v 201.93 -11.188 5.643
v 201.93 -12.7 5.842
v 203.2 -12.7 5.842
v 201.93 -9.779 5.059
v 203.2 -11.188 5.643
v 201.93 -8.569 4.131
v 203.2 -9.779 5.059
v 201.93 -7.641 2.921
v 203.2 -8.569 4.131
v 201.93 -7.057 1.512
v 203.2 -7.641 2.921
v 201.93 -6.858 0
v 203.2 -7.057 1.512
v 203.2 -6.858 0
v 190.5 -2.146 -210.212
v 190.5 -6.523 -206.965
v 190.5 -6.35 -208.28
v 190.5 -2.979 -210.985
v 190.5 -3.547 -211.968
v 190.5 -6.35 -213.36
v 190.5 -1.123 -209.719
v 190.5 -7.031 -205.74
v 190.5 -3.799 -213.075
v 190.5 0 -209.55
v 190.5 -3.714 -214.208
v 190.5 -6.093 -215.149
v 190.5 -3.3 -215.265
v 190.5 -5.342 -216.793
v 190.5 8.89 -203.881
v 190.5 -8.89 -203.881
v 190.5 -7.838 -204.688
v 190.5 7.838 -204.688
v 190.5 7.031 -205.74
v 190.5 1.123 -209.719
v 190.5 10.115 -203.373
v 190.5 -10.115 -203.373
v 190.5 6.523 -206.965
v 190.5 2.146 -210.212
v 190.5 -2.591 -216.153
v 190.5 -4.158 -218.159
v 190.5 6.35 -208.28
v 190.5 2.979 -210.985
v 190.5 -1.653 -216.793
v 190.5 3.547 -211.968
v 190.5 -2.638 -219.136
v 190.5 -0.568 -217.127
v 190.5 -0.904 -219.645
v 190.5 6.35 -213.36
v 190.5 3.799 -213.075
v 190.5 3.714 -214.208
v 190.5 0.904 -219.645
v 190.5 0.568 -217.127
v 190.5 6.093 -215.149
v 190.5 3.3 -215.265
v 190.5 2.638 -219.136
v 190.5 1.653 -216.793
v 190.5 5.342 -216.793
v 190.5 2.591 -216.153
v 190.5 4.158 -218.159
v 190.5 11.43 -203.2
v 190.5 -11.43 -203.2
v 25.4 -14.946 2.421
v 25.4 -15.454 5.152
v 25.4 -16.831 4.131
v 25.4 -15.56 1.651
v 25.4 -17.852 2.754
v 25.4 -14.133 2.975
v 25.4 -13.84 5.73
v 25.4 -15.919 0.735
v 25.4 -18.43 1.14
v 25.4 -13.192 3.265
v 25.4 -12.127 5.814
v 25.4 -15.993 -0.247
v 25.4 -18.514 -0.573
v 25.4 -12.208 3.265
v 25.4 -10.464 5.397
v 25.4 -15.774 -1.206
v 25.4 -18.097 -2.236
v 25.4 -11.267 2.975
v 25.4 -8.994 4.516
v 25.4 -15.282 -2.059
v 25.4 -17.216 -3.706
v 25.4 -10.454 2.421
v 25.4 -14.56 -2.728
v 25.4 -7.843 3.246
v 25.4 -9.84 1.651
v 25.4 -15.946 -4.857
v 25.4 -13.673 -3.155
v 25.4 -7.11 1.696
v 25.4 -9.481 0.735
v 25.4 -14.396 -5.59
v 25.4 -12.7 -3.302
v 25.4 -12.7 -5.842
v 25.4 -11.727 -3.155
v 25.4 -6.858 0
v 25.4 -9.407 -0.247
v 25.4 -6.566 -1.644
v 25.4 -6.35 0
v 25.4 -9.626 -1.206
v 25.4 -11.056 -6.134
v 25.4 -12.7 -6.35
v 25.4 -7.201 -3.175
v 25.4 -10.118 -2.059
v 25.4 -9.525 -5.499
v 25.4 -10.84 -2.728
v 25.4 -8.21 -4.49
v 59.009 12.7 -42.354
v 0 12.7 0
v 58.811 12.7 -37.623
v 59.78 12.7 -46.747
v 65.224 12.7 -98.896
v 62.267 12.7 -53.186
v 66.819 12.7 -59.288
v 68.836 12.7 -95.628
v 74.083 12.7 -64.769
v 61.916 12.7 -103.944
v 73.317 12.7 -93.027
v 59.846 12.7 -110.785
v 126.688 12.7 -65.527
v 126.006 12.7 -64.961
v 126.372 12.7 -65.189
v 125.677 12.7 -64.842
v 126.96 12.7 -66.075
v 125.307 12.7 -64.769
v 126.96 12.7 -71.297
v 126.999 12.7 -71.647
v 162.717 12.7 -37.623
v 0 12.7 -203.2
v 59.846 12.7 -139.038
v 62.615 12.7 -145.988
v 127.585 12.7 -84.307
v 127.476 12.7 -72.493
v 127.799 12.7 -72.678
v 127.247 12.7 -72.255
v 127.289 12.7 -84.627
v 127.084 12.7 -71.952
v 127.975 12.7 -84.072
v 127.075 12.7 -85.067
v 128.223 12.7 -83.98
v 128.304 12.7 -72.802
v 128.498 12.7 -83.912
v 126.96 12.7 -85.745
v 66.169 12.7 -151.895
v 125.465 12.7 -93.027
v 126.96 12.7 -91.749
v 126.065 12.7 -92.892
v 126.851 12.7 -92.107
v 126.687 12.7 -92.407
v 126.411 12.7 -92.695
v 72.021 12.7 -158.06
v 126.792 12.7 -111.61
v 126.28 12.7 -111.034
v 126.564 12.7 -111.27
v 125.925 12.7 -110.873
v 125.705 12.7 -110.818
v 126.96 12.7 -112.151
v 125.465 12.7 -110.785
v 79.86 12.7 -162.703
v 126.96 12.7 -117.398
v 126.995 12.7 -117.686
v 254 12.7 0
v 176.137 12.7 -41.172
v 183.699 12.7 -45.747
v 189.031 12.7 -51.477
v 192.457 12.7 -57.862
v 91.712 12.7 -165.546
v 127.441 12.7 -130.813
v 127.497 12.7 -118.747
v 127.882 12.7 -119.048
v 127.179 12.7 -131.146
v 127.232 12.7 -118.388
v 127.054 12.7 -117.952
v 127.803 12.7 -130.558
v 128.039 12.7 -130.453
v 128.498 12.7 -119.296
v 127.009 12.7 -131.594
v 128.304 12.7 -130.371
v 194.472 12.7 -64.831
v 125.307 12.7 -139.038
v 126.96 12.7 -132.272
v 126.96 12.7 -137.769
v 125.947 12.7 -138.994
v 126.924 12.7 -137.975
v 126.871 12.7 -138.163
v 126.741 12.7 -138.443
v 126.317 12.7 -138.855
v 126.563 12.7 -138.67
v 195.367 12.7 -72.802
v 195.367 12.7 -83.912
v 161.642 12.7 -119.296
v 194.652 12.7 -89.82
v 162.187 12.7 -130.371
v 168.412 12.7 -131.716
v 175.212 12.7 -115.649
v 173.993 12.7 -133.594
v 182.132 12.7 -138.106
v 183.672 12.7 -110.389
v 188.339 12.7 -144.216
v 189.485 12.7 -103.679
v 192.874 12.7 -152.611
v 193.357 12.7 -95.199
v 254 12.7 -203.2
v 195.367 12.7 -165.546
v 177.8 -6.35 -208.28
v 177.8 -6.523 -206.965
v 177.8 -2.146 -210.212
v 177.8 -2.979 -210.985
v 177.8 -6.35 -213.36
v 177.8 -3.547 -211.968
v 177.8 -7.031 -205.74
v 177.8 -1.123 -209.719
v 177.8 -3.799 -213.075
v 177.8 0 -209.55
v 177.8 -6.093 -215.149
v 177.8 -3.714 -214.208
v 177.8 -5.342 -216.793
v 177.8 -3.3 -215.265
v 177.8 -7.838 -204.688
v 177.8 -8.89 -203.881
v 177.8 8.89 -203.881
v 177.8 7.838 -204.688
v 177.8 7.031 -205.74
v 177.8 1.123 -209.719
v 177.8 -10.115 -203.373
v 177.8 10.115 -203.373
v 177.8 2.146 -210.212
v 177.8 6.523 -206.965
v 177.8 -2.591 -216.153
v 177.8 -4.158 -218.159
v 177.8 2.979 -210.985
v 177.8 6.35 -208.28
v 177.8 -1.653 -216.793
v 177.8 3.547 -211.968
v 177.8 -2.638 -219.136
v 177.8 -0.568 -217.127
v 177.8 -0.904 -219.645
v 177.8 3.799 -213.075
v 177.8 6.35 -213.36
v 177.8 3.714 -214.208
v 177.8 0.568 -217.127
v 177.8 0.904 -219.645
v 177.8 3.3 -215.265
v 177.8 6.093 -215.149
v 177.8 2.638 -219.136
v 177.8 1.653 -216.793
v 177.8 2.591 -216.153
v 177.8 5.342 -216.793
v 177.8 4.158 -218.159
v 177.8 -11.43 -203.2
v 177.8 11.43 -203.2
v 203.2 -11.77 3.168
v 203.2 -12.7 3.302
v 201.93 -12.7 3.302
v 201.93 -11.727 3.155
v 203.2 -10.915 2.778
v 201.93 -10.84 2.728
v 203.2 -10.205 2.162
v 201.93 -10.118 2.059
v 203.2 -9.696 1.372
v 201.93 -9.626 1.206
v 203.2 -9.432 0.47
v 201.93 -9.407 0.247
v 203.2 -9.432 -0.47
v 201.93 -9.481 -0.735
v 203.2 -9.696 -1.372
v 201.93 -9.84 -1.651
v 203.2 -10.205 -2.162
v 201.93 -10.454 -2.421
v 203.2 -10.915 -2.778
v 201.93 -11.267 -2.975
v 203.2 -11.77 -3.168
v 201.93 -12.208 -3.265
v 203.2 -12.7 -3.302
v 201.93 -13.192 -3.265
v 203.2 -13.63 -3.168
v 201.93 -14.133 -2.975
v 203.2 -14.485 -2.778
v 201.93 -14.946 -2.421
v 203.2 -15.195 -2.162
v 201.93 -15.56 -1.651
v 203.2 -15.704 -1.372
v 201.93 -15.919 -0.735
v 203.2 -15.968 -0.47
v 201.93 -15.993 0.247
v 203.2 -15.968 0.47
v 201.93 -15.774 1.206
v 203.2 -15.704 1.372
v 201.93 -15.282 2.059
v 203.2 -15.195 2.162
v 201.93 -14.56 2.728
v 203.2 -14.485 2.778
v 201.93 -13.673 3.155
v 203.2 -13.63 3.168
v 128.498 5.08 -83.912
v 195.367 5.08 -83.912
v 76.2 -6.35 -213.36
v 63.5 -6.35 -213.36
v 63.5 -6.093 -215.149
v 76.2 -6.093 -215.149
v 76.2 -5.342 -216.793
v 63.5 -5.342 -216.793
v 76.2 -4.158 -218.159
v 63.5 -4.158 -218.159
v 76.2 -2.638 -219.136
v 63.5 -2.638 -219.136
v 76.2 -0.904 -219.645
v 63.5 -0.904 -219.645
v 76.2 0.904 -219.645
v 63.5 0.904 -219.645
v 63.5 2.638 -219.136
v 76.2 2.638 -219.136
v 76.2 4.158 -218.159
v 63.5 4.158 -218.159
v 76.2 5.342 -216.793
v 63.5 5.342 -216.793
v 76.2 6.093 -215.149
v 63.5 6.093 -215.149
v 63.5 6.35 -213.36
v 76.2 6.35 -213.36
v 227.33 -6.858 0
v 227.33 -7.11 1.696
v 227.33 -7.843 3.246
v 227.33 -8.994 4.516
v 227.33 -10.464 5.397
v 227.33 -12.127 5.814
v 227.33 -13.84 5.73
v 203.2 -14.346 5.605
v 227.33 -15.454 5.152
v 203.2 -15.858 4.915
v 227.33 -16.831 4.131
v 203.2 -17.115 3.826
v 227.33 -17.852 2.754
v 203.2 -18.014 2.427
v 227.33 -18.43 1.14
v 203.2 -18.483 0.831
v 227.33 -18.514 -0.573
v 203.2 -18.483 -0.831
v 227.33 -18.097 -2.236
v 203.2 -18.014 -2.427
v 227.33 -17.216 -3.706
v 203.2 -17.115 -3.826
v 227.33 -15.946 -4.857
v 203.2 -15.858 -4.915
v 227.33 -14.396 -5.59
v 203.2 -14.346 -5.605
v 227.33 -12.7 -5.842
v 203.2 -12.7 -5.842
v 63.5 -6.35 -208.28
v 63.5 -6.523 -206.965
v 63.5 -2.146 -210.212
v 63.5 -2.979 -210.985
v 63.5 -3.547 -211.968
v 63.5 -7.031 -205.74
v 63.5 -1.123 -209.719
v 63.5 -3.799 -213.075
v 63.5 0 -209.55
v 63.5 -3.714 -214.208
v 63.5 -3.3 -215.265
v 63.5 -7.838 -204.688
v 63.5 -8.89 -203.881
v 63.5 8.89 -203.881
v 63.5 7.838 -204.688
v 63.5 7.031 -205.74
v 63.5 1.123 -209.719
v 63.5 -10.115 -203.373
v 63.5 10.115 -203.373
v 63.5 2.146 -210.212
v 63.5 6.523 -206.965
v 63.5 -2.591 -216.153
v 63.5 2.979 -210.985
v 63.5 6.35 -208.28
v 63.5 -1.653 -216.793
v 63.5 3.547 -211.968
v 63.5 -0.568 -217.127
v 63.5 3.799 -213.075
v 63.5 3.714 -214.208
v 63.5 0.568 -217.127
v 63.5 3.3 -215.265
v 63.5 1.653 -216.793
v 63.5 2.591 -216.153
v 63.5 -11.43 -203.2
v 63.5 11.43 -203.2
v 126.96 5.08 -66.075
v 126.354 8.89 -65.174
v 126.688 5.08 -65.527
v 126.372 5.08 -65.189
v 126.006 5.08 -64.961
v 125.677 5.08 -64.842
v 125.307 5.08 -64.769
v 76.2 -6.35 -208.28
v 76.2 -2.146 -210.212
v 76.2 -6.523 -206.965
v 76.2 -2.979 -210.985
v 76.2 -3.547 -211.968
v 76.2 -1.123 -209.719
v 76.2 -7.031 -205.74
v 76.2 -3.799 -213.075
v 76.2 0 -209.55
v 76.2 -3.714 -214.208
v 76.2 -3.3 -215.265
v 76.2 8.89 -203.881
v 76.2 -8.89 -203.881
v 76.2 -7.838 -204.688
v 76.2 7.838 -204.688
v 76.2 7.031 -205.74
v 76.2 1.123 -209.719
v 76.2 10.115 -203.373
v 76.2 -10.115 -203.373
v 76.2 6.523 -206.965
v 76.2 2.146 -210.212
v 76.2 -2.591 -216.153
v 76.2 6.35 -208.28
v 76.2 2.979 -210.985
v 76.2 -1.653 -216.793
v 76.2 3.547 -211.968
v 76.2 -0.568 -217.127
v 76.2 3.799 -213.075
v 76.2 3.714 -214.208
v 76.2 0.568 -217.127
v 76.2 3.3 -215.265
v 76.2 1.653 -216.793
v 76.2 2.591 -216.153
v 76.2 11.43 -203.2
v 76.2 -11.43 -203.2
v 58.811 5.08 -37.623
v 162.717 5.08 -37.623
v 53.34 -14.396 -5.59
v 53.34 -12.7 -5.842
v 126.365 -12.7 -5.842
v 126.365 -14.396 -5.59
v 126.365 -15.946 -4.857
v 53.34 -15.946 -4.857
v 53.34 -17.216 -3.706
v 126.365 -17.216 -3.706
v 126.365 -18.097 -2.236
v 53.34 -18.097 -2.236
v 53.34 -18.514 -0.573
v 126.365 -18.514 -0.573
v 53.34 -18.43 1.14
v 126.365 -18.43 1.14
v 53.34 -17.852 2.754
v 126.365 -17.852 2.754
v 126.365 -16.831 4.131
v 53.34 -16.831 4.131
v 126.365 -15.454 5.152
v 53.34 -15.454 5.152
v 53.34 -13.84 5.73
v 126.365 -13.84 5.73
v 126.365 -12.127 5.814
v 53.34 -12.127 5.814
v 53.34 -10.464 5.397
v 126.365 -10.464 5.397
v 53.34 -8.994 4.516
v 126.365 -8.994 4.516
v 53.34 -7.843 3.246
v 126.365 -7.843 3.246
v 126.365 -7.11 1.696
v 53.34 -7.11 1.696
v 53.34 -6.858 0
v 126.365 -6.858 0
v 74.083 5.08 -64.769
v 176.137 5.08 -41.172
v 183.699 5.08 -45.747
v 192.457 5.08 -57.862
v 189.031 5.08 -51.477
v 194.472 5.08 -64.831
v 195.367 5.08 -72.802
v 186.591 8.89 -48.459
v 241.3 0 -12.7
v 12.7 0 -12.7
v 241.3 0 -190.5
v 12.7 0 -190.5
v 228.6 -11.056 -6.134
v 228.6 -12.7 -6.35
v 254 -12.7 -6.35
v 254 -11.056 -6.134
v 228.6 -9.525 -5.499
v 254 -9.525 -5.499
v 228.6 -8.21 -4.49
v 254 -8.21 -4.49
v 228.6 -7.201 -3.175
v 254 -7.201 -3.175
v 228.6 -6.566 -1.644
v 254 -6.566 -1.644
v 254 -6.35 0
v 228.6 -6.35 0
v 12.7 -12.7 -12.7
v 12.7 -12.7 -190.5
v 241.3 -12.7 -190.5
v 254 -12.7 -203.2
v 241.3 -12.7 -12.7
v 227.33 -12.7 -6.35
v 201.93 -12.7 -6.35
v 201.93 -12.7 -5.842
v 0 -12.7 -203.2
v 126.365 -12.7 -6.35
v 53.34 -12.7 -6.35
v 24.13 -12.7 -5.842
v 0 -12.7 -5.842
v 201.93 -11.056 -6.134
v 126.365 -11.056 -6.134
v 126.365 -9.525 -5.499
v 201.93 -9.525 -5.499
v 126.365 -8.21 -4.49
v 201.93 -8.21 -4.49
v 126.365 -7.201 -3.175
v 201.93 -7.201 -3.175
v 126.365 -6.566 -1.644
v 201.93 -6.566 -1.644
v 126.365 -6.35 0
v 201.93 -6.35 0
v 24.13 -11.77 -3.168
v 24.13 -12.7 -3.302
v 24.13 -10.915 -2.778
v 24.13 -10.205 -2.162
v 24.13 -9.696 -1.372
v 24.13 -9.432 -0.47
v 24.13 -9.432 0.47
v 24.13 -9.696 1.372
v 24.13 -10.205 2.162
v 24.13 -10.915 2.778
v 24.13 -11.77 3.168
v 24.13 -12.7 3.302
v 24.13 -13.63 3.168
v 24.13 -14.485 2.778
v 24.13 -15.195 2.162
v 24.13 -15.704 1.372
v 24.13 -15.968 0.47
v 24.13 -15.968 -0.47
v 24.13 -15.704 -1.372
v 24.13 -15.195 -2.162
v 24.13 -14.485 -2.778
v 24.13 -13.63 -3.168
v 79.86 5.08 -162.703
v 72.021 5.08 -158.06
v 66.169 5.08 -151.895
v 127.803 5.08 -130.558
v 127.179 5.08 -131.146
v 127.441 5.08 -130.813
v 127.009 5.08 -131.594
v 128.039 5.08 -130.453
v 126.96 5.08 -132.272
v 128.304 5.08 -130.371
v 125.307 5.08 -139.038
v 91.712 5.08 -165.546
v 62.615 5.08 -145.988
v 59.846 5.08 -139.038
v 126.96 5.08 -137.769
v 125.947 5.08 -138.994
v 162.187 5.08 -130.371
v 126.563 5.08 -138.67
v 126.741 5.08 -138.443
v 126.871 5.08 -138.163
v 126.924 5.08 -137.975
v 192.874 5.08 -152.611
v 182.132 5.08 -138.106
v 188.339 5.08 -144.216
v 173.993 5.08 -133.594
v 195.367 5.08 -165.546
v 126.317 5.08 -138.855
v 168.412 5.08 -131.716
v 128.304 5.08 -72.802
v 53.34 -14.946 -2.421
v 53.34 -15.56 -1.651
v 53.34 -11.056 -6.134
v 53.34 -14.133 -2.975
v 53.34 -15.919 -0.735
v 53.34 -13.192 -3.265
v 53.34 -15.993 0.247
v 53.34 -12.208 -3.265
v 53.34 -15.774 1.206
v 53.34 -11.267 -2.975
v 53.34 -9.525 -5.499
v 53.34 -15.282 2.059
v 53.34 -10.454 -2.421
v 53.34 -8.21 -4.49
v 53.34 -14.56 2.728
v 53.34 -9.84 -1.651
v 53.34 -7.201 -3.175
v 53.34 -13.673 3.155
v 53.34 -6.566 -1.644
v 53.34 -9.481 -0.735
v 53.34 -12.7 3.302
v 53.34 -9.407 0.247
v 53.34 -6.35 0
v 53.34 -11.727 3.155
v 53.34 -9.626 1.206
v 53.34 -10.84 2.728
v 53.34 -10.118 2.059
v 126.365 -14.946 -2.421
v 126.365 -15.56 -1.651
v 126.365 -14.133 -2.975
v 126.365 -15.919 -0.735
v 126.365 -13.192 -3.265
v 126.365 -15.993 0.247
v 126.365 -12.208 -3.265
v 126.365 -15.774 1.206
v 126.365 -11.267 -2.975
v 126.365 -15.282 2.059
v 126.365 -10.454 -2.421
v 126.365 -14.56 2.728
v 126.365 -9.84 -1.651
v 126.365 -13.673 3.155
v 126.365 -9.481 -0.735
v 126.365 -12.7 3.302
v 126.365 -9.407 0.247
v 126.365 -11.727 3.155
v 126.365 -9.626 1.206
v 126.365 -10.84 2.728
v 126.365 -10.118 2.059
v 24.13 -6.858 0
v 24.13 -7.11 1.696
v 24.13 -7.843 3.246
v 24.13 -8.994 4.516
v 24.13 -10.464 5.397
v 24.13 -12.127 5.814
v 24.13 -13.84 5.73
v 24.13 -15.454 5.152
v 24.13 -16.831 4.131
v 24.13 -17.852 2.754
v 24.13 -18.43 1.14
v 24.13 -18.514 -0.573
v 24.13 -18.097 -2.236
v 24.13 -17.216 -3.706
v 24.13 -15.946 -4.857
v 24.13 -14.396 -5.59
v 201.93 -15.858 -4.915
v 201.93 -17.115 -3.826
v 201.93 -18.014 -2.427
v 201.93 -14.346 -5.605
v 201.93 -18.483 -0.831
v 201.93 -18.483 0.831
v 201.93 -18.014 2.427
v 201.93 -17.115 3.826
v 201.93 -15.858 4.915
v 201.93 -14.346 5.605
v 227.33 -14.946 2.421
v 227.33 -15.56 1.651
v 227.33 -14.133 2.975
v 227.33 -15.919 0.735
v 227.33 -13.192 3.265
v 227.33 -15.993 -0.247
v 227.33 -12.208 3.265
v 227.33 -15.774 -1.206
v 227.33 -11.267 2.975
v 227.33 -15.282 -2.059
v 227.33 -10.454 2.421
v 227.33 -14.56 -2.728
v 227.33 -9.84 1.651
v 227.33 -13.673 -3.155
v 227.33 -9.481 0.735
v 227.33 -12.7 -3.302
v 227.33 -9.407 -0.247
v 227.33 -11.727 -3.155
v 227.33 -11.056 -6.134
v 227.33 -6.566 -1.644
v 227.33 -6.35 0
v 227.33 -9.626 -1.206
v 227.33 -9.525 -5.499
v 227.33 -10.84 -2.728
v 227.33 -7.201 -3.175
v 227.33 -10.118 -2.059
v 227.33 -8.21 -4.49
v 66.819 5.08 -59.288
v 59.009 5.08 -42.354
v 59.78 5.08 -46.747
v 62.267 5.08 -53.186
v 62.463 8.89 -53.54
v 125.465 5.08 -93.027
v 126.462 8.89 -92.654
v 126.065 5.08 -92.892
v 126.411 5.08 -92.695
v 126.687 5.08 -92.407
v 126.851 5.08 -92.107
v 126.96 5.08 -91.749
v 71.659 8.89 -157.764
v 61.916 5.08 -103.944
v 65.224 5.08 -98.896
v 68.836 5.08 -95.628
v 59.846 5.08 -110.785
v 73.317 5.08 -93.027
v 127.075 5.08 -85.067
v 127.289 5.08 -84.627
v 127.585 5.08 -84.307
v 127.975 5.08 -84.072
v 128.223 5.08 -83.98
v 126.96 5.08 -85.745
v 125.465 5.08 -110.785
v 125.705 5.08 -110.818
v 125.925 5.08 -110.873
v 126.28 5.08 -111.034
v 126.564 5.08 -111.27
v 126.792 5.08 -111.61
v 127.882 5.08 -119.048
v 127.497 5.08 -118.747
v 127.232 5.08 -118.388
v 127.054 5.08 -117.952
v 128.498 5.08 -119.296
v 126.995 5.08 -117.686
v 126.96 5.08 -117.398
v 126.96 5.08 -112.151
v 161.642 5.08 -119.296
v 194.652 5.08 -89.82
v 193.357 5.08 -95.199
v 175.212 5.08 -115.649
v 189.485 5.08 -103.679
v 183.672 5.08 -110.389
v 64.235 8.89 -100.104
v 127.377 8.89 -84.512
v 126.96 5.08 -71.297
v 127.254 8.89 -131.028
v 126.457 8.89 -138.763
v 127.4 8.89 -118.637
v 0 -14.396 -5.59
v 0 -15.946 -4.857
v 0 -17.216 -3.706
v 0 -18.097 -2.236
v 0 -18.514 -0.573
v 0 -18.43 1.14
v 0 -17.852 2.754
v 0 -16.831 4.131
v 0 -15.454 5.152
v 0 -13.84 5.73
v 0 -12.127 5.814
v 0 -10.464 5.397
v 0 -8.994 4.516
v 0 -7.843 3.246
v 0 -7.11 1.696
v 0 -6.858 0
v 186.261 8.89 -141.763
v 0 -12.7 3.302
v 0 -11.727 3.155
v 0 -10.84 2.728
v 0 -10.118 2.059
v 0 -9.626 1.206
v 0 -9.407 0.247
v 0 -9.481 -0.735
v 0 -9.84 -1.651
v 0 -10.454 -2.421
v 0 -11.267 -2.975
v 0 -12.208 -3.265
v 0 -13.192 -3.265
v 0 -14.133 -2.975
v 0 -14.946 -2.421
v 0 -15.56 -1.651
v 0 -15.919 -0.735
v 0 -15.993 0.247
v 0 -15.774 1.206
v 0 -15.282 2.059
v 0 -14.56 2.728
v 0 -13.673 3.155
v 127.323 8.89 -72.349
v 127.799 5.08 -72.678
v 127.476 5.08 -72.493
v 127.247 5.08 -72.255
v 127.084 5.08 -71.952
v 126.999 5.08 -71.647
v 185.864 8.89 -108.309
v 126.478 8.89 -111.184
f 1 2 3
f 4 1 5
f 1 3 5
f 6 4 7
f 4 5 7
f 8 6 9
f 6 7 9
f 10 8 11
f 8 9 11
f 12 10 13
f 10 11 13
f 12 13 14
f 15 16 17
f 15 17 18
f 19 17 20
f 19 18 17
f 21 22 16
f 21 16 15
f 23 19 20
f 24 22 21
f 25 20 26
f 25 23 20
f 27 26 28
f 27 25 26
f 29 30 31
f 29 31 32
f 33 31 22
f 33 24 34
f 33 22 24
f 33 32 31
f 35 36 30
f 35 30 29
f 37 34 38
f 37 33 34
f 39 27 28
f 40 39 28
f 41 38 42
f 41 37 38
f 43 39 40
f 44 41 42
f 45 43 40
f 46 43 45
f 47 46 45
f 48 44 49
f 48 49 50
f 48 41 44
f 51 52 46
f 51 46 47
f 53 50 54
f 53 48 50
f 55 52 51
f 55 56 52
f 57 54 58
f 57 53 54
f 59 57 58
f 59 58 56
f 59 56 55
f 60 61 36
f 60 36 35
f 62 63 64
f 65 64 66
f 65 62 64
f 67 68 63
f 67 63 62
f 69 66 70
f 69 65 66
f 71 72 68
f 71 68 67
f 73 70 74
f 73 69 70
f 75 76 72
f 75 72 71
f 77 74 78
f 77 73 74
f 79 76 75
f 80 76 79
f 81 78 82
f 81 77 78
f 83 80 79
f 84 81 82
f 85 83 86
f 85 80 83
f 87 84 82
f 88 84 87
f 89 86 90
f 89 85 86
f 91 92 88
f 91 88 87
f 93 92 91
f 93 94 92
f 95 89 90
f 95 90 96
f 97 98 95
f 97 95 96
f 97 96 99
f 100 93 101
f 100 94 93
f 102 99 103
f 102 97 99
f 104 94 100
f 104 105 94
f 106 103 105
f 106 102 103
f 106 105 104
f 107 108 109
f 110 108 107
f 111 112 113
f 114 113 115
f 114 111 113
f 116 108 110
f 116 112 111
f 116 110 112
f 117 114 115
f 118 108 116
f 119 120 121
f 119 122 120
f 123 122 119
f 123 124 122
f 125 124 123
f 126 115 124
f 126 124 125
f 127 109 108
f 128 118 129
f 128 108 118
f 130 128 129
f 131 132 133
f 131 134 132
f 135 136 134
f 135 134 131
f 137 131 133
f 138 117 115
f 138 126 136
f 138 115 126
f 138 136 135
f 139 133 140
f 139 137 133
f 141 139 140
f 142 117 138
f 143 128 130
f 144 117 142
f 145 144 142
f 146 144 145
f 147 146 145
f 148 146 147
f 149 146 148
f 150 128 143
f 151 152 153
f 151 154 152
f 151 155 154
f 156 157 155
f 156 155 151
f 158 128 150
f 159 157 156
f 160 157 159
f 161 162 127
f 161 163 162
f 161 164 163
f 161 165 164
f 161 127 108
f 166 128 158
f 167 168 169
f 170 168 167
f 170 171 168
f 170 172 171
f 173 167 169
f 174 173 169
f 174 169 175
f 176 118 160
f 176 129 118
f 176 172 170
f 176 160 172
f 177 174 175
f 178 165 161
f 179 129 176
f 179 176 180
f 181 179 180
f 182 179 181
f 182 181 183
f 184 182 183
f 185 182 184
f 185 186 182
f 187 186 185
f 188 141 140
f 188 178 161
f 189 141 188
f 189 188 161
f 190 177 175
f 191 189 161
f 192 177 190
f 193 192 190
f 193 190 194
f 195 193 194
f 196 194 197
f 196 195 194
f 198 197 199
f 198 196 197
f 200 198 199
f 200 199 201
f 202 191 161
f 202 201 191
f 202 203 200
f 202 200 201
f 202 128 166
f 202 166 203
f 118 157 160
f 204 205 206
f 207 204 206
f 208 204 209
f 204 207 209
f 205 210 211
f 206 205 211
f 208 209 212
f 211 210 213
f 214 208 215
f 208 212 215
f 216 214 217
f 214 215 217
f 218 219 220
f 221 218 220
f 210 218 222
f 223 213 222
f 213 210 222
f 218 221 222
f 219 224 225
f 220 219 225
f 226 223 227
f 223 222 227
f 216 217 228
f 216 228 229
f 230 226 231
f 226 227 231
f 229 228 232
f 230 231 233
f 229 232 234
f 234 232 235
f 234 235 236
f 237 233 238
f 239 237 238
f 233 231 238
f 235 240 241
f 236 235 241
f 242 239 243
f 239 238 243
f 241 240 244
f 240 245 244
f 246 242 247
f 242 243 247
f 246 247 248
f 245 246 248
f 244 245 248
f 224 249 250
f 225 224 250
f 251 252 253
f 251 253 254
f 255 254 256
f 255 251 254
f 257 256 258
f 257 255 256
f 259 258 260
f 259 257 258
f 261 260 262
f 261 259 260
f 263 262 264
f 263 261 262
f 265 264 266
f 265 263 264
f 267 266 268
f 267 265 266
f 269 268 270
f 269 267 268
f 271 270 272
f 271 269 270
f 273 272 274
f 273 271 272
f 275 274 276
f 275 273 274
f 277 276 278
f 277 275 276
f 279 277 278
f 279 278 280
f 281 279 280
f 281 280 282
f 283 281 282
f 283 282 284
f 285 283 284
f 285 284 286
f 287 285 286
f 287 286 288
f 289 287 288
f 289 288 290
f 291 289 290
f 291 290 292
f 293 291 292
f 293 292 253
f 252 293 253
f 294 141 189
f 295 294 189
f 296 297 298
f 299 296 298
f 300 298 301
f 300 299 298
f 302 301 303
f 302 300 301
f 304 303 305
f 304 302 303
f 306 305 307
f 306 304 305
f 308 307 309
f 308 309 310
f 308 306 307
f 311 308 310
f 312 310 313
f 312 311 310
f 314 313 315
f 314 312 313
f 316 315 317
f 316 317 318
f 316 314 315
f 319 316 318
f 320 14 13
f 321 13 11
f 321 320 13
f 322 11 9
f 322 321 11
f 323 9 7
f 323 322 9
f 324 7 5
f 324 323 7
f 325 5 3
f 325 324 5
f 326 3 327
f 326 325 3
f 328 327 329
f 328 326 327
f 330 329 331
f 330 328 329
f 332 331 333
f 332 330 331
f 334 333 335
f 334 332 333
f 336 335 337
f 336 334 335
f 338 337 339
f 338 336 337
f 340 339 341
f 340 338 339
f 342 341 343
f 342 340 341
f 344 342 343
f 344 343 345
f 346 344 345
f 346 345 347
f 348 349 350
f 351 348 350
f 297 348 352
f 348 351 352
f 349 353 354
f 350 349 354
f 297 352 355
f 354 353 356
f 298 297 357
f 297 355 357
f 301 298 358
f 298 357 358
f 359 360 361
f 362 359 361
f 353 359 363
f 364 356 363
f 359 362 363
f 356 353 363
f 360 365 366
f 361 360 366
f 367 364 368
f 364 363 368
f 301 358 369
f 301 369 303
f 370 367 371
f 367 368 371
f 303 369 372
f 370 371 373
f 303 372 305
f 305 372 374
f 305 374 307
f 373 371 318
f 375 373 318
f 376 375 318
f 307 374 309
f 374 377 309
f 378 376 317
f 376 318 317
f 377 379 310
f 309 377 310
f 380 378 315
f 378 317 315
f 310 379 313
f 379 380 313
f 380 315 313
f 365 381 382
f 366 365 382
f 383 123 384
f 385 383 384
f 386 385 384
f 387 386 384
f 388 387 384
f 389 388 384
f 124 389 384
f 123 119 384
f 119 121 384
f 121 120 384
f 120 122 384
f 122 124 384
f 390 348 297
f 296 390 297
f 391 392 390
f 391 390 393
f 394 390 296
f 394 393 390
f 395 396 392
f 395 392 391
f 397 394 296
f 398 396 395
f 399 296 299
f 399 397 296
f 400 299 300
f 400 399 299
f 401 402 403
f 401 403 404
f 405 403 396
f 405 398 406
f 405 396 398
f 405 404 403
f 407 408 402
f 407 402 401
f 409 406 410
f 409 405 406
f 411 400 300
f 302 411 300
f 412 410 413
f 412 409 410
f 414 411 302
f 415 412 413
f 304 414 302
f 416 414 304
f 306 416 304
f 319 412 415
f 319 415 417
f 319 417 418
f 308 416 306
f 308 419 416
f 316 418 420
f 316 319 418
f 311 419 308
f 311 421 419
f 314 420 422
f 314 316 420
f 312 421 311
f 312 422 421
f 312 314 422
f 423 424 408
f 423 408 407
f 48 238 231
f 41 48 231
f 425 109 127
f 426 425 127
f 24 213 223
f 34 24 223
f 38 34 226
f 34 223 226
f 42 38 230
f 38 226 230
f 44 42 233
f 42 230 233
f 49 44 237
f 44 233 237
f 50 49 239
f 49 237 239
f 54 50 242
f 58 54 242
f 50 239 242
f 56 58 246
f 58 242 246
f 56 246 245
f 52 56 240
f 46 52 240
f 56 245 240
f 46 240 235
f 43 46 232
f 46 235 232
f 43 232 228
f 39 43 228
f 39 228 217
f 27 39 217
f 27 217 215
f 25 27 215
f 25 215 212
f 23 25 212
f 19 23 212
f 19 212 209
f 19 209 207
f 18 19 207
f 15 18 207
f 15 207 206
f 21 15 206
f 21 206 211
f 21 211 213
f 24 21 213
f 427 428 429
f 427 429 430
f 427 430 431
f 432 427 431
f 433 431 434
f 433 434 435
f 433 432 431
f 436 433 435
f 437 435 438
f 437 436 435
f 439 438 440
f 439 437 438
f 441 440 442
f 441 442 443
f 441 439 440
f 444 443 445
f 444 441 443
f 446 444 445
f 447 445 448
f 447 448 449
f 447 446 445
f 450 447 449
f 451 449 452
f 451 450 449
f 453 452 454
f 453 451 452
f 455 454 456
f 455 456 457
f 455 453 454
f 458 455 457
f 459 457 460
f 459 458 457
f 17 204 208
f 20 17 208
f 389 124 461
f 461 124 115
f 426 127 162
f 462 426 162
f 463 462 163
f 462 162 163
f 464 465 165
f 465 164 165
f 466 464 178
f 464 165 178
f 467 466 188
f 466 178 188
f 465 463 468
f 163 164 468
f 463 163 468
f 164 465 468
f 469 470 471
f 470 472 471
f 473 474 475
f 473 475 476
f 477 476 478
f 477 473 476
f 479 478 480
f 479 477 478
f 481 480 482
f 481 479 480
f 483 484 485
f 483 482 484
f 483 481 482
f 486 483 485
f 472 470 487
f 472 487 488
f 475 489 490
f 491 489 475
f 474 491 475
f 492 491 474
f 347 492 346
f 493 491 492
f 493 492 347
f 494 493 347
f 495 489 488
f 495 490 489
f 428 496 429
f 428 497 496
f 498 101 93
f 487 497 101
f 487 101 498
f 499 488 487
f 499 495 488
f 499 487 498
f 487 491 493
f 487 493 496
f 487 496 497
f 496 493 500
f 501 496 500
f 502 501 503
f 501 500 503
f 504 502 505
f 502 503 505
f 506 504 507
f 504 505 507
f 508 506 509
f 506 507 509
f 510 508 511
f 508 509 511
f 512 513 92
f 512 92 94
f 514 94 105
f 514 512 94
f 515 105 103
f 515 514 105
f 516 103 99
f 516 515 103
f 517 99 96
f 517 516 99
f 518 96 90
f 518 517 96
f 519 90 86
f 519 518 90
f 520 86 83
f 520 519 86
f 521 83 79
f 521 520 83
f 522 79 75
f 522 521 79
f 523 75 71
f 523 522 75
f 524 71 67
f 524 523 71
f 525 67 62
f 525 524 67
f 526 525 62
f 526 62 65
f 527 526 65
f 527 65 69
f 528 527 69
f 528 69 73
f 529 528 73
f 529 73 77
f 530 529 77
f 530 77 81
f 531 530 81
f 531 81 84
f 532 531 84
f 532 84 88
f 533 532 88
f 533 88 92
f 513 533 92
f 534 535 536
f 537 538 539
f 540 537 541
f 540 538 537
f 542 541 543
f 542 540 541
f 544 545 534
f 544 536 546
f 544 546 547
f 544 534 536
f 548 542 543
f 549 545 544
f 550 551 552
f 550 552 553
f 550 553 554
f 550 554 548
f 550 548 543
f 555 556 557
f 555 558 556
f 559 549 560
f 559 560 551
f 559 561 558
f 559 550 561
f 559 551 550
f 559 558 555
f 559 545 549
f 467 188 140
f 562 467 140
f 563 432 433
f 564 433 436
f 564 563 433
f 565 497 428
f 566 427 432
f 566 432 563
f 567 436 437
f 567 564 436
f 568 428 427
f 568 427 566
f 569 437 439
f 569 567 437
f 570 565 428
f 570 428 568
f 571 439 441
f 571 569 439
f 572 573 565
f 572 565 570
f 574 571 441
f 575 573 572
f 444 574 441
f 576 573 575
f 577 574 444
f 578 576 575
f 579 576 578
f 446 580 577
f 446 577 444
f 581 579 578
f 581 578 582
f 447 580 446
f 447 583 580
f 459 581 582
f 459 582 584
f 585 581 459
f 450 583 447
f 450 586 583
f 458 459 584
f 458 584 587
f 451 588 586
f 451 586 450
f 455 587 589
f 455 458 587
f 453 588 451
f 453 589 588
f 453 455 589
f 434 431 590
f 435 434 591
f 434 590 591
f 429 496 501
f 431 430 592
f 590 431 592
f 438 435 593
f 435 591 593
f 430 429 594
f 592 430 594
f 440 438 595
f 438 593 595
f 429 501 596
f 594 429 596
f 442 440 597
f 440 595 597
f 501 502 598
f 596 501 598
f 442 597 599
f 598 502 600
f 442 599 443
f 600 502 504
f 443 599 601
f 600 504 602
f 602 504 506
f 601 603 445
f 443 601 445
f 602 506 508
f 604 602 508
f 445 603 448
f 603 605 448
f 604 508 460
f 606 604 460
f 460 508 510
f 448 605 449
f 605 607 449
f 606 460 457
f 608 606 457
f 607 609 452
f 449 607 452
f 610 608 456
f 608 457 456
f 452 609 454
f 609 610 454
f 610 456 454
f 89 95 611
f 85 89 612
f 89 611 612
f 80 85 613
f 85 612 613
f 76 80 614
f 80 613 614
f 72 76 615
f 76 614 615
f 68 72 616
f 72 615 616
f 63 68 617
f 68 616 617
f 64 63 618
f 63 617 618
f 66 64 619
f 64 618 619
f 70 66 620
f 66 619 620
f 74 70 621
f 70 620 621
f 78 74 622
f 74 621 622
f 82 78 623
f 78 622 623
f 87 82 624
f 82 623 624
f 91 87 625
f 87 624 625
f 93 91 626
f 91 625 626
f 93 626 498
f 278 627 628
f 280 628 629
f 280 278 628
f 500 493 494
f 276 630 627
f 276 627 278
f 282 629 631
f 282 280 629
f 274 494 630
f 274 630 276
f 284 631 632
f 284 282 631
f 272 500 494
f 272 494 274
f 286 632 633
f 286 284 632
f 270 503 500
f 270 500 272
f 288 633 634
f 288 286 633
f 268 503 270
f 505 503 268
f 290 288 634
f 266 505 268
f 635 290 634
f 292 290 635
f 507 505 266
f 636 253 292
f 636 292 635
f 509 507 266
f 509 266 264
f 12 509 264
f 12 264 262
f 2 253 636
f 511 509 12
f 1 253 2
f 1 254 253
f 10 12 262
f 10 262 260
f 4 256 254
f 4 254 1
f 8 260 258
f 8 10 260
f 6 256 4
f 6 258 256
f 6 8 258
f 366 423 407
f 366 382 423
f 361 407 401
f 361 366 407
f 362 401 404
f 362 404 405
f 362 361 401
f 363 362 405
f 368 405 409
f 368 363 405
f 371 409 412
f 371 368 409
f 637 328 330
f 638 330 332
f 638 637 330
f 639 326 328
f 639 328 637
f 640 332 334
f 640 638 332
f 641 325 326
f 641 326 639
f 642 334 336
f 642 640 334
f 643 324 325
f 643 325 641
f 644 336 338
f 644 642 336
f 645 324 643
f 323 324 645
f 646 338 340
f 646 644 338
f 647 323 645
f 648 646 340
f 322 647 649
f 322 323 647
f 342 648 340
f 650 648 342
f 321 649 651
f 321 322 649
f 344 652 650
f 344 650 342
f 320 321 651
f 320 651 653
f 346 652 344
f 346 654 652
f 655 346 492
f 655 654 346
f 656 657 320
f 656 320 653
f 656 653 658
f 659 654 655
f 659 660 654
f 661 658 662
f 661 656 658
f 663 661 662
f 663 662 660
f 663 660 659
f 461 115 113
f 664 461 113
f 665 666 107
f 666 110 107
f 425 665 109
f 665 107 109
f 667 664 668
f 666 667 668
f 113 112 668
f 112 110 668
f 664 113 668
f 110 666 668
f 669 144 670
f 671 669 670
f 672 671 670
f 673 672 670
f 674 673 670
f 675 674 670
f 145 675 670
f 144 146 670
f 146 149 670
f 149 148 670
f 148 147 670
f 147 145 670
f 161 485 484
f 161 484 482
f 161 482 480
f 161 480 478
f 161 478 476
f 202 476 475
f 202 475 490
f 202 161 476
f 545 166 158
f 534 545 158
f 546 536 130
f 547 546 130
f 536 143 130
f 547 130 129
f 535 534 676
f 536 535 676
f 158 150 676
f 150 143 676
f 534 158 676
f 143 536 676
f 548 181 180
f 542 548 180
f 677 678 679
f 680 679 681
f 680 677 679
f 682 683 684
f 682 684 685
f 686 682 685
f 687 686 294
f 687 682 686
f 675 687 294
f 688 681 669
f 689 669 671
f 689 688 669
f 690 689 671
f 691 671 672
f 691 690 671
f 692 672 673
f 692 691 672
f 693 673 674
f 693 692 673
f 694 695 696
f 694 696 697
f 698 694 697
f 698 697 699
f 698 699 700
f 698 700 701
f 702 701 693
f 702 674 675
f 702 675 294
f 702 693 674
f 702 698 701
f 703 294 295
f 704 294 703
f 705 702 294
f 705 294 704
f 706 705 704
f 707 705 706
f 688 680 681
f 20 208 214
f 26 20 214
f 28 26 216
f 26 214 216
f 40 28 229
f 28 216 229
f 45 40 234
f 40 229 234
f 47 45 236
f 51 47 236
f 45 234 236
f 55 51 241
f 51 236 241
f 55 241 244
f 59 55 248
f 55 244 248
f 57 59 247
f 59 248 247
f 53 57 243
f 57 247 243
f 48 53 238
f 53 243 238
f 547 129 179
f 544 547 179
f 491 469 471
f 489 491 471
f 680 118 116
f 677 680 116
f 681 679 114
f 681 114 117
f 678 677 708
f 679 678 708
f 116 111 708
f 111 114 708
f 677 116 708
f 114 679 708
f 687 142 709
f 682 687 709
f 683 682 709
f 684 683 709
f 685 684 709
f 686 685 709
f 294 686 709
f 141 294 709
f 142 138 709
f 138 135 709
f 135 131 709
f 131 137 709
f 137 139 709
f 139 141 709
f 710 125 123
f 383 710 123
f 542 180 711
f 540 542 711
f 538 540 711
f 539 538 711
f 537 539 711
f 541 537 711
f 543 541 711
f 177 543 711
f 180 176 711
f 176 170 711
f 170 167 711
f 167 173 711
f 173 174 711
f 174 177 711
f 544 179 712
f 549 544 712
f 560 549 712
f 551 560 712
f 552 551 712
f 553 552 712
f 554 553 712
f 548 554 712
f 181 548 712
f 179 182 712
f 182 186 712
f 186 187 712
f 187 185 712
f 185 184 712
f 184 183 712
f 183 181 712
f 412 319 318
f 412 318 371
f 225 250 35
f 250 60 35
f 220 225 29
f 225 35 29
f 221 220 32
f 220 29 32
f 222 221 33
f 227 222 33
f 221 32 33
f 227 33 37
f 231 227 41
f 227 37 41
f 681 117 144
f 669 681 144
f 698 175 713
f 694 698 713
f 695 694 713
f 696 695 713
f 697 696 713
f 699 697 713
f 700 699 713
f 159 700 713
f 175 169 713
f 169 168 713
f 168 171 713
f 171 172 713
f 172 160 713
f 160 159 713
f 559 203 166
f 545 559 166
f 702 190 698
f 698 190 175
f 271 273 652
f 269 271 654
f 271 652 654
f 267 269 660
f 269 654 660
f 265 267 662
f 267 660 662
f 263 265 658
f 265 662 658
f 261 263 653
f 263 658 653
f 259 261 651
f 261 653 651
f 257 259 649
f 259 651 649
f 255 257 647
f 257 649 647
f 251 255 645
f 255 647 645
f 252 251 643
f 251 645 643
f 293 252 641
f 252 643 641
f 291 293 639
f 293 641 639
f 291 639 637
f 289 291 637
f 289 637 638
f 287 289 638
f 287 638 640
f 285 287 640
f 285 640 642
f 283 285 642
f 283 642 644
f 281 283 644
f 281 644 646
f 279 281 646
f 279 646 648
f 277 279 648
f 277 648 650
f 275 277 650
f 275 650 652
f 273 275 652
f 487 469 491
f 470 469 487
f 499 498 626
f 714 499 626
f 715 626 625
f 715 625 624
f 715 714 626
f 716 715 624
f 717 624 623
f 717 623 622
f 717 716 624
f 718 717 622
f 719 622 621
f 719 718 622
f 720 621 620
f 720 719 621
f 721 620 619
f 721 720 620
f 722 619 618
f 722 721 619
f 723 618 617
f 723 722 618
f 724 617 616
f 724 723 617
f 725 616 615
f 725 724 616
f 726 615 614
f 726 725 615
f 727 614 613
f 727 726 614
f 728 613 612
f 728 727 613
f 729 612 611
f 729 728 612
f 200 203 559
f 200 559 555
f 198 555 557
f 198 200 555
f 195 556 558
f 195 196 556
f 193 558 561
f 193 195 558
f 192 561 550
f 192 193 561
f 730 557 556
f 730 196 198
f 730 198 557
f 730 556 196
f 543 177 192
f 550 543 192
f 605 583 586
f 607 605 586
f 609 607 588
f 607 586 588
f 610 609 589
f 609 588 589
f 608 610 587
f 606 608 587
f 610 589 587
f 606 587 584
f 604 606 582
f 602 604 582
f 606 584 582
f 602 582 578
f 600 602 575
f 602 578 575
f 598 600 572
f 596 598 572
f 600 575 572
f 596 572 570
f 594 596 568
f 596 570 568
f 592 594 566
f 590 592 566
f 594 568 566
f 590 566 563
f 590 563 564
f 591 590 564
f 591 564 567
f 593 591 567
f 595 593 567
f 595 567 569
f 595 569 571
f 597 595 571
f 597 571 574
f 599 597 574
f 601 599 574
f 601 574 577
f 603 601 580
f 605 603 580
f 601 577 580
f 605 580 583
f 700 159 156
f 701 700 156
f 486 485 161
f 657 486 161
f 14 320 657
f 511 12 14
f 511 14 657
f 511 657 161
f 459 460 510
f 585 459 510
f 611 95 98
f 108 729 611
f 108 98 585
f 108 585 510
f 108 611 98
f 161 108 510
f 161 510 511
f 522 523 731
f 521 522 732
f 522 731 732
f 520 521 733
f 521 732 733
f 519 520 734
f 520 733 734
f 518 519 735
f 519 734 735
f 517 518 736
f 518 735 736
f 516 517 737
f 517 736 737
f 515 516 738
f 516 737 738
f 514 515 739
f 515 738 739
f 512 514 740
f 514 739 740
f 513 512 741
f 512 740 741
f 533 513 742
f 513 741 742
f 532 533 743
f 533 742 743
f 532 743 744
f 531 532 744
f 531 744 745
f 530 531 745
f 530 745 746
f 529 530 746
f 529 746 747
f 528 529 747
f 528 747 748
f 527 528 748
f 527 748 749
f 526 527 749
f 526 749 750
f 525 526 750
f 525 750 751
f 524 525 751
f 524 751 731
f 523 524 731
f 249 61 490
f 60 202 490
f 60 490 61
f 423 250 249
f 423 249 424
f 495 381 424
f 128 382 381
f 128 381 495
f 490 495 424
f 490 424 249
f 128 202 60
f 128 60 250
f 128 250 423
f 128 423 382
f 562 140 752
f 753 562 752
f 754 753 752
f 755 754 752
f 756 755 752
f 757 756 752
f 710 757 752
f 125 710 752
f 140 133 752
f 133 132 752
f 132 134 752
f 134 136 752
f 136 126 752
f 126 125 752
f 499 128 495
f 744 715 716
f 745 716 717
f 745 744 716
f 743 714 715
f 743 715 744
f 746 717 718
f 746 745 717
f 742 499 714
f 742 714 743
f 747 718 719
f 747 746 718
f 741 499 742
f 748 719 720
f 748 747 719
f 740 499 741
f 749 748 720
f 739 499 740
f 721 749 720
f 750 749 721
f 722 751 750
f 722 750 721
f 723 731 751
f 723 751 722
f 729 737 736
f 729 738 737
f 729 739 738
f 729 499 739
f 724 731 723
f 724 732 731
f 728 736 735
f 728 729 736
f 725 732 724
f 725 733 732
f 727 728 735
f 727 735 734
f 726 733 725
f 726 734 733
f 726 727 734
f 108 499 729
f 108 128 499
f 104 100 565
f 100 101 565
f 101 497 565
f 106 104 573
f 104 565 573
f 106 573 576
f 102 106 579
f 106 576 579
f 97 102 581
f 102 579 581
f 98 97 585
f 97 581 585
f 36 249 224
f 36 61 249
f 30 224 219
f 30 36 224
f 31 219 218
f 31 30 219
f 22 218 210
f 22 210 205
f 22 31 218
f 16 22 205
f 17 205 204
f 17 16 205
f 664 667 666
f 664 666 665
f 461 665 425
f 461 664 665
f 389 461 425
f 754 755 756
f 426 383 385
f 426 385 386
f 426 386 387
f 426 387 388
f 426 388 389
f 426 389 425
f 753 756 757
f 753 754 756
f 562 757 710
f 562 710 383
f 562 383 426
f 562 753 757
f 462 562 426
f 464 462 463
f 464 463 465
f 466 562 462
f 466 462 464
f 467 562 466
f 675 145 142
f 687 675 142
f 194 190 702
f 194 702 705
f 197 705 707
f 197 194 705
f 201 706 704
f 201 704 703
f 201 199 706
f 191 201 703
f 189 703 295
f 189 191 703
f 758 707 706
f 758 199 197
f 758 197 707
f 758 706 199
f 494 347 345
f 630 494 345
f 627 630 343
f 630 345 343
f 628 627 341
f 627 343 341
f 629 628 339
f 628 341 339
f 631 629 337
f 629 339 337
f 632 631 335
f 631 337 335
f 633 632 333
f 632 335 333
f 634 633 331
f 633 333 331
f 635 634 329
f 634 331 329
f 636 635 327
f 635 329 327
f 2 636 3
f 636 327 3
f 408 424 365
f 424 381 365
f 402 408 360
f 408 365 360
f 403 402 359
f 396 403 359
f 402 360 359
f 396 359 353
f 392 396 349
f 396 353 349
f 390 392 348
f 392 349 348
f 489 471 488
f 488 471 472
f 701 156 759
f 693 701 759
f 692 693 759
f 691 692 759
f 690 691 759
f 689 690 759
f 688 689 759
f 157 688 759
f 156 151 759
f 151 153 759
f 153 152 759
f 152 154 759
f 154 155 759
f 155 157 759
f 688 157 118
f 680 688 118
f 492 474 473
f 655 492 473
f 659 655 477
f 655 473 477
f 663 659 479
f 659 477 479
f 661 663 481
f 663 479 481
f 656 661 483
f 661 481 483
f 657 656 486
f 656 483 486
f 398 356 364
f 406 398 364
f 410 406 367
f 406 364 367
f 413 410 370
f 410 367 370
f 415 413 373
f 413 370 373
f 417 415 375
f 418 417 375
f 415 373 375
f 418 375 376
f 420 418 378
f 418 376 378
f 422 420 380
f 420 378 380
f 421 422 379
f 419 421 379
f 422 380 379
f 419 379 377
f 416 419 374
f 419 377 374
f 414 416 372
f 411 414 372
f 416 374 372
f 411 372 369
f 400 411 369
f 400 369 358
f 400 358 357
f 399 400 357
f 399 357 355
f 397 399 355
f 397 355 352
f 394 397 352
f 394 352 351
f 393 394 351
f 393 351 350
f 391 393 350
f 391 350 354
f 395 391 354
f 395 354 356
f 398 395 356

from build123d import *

# Parameters (mm, degrees)
SKETCH1_W            = 254
SKETCH1_H            = 203.2
BOSS_EXTRUDE2_DEPTH  = 12.7
SKETCH2_W            = 254
SKETCH2_H            = 203.2
SKETCH2_W_2          = 228.6
SKETCH2_H_2          = 177.8
BOSS_EXTRUDE3_DEPTH  = 12.7
SKETCH6_R            = 6.35
CUT_EXTRUDE2_DEPTH   = 52.07
SKETCH8_R            = 6.35
CUT_EXTRUDE3_DEPTH   = 52.07
SKETCH9_R            = 3.302
BOSS_EXTRUDE5_DEPTH  = 25.4
SKETCH10_R           = 6.35
CUT_EXTRUDE4_DEPTH   = 45.212
SKETCH11_R           = 6.35
CUT_EXTRUDE5_DEPTH   = 190.246
SKETCH12_R           = 5.842
SKETCH12_R_2         = 3.302
BOSS_EXTRUDE6_DEPTH  = 24.13
SKETCH15_R           = 6.35
CUT_EXTRUDE6_DEPTH   = 1.27
SKETCH17_R           = 3.302
BOSS_EXTRUDE7_DEPTH  = 1.27
SKETCH18_R           = 3.302
BOSS_EXTRUDE8_DEPTH  = 1.27
SKETCH19_R           = 5.842
SKETCH19_R_2         = 3.302
BOSS_EXTRUDE9_DEPTH  = 73.025
CUT_EXTRUDE7_DEPTH   = 7.62
SKETCH21_R           = 6.35
BOSS_EXTRUDE10_DEPTH = 12.7
SKETCH23_R           = 6.35
BOSS_EXTRUDE11_DEPTH = 12.7
SKETCH24_R           = 3.81
CUT_EXTRUDE8_DEPTH   = 167.132
FILLET1_R            = 5.08


with BuildPart() as part:
    # Sketch1 → Boss-Extrude2 (new body)
    with BuildSketch(Plane(origin=(0, 0, 0), x_dir=(1, 0, 0), z_dir=(0, 1, 0))):
        with Locations((127, 101.6)):
            Rectangle(SKETCH1_W, SKETCH1_H)
    extrude(amount=BOSS_EXTRUDE2_DEPTH)

    # Sketch2 → Boss-Extrude3 (add)
    with BuildSketch(Plane(origin=(0, 0, 0), x_dir=(-1, 0, 0), z_dir=(0, -1, 0))):
        with Locations((-127, 101.6)):
            Rectangle(SKETCH2_W, SKETCH2_H)
        with Locations((-127, 101.6)):
            Rectangle(SKETCH2_W_2, SKETCH2_H_2, mode=Mode.SUBTRACT)
    extrude(amount=BOSS_EXTRUDE3_DEPTH)

    # Sketch6 → Cut-Extrude2 (cut)
    with BuildSketch(Plane(origin=(228.6, 0, 0), x_dir=(0, 0, -1), z_dir=(1, 0, 0))):
        with Locations((0, -12.7)):
            Circle(SKETCH6_R)
    extrude(amount=-CUT_EXTRUDE2_DEPTH, mode=Mode.SUBTRACT)

    # Sketch8 → Cut-Extrude3 (cut)
    with BuildSketch(Plane.ZY.offset(-25.4)):
        with Locations((0, -12.7)):
            Circle(SKETCH8_R)
    extrude(amount=-CUT_EXTRUDE3_DEPTH, mode=Mode.SUBTRACT)

    # Sketch9 → Boss-Extrude5 (add)
    with BuildSketch(Plane(origin=(228.6, 0, 0), x_dir=(0, 0, -1), z_dir=(1, 0, 0))):
        with BuildLine():
            Line((0, -4.734153711), (0, -6.858))
            ThreePointArc((0, -6.858), (-4.130917816, -16.830917816), (5.842, -12.7))
            Line((5.842, -12.7), (6.842694324, -12.7))
            Line((6.842694324, -12.7), (6.842694324, -8.927228158))
            Line((6.842694324, -8.927228158), (0, -4.734153711))
        make_face()
        with Locations((0, -12.7)):
            Circle(SKETCH9_R, mode=Mode.SUBTRACT)
    extrude(amount=-BOSS_EXTRUDE5_DEPTH)

    # Sketch10 → Cut-Extrude4 (cut)
    with BuildSketch(Plane(origin=(228.6, 0, 0), x_dir=(0, 0, -1), z_dir=(1, 0, 0))):
        with Locations((0, -12.7)):
            Circle(SKETCH10_R)
    extrude(amount=CUT_EXTRUDE4_DEPTH, mode=Mode.SUBTRACT)

    # Sketch11 → Cut-Extrude5 (cut)
    with BuildSketch(Plane(origin=(176.53, 0, 0), x_dir=(0, 0, -1), z_dir=(1, 0, 0))):
        with Locations((0, -12.7)):
            Circle(SKETCH11_R)
    extrude(amount=-CUT_EXTRUDE5_DEPTH, mode=Mode.SUBTRACT)

    # Sketch12 → Boss-Extrude6 (add)
    with BuildSketch(Plane.ZY):
        with BuildLine():
            ThreePointArc((-5.842, -12.7), (-4.130917816, -8.569082184), (0, -6.858))
            Line((0, -6.858), (0, -6.35))
            ThreePointArc((0, -6.35), (-4.490128061, -8.209871939), (-6.35, -12.7))
            Line((-6.35, -12.7), (-5.842, -12.7))
        make_face()
        with Locations((0, -12.7)):
            Circle(SKETCH12_R)
        with Locations((0, -12.7)):
            Circle(SKETCH12_R_2, mode=Mode.SUBTRACT)
    extrude(amount=-BOSS_EXTRUDE6_DEPTH)

    # Sketch15 → Cut-Extrude6 (cut)
    with BuildSketch(Plane(origin=(228.6, 0, 0), x_dir=(0, 0, -1), z_dir=(1, 0, 0))):
        with Locations((0, -12.7)):
            Circle(SKETCH15_R)
    extrude(amount=-CUT_EXTRUDE6_DEPTH, mode=Mode.SUBTRACT)

    # Sketch17 → Boss-Extrude7 (add)
    with BuildSketch(Plane.ZY.offset(-203.2)):
        with BuildLine():
            ThreePointArc((-5.842, -12.7), (-4.130917816, -8.569082184), (0, -6.858))
            Line((0, -6.858), (0, -6.35))
            ThreePointArc((0, -6.35), (-4.490128061, -8.209871939), (-6.35, -12.7))
            Line((-6.35, -12.7), (-5.842, -12.7))
        make_face()
        with BuildLine():
            ThreePointArc((5.842, -12.7), (4.130917816, -8.569082184), (0, -6.858))
            ThreePointArc((0, -6.858), (-4.130917816, -8.569082184), (-5.842, -12.7))
            ThreePointArc((-5.842, -12.7), (0, -18.542), (5.842, -12.7))
        make_face()
        with Locations((0, -12.7)):
            Circle(SKETCH17_R, mode=Mode.SUBTRACT)
    extrude(amount=BOSS_EXTRUDE7_DEPTH)

    # Sketch18 → Boss-Extrude8 (add)
    with BuildSketch(Plane(origin=(24.13, 0, 0), x_dir=(0, 0, -1), z_dir=(1, 0, 0))):
        with BuildLine():
            Line((0, -6.35), (0, -6.858))
            ThreePointArc((0, -6.858), (4.130917816, -8.569082184), (5.842, -12.7))
            Line((5.842, -12.7), (6.35, -12.7))
            ThreePointArc((6.35, -12.7), (4.490128061, -8.209871939), (0, -6.35))
        make_face()
        with BuildLine():
            ThreePointArc((5.842, -12.7), (4.130917816, -8.569082184), (0, -6.858))
            ThreePointArc((0, -6.858), (-4.130917816, -16.830917816), (5.842, -12.7))
        make_face()
        with Locations((0, -12.7)):
            Circle(SKETCH18_R, mode=Mode.SUBTRACT)
    extrude(amount=BOSS_EXTRUDE8_DEPTH)

    # Sketch19 → Boss-Extrude9 (add)
    with BuildSketch(Plane.ZY.offset(-53.34)):
        with BuildLine():
            ThreePointArc((-5.842, -12.7), (-4.130917816, -8.569082184), (0, -6.858))
            Line((0, -6.858), (0, -5.334694101))
            Line((0, -5.334694101), (-5.217733662, -7.625492191))
            Line((-5.217733662, -7.625492191), (-6.523890468, -10.619605484))
            Line((-6.523890468, -10.619605484), (-6.724837669, -12.7))
            Line((-6.724837669, -12.7), (-5.842, -12.7))
        make_face()
        with Locations((0, -12.7)):
            Circle(SKETCH19_R)
        with Locations((0, -12.7)):
            Circle(SKETCH19_R_2, mode=Mode.SUBTRACT)
    extrude(amount=-BOSS_EXTRUDE9_DEPTH)

    # Sketch3 → Cut-Extrude7 (cut)
    with BuildSketch(Plane(origin=(0, 12.7, 0), x_dir=(1, 0, 0), z_dir=(0, 1, 0))):
        with BuildLine():
            Line((195.366950221, 165.545782342), (91.71222682, 165.545782342))
            add(Edge.make_bspline(
                [(91.71222682, 165.545782342), (67.539208551, 163.235170178), (59.846395191, 139.038085668)],
                knots=[0, 0, 0, 1, 1, 1], degree=2))
            Line((59.846395191, 139.038085668), (125.30712104, 139.038085668))
            add(Edge.make_bspline(
                [(125.30712104, 139.038085668), (126.780616205, 139.122377702), (126.96048329, 137.769188416)],
                knots=[0, 0, 0, 1, 1, 1], degree=2))
            Line((126.96048329, 137.769188416), (126.96048329, 132.272484091))
            add(Edge.make_bspline(
                [(126.96048329, 132.272484091), (126.876874172, 130.733531241), (128.303731924, 130.371199046)],
                knots=[0, 0, 0, 1, 1, 1], degree=2))
            Line((128.303731924, 130.371199046), (162.187188306, 130.371199046))
            add(Edge.make_bspline(
                [(195.366950221, 165.545782342), (193.745607246, 135.56730888), (162.187188306, 130.371199046)],
                knots=[0, 0, 0, 1, 1, 1], degree=2))
        make_face()
        with BuildLine():
            Line((161.642347888, 119.295964928), (128.497808789, 119.295964928))
            add(Edge.make_bspline(
                [(128.497808789, 119.295964928), (127.070096751, 118.926569019), (126.96048329, 117.397764841)],
                knots=[0, 0, 0, 1, 1, 1], degree=2))
            Line((126.96048329, 117.397764841), (126.96048329, 112.151116085))
            add(Edge.make_bspline(
                [(126.96048329, 112.151116085), (126.743790117, 110.899444942), (125.464733978, 110.784690654)],
                knots=[0, 0, 0, 1, 1, 1], degree=2))
            Line((125.464733978, 110.784690654), (59.846395191, 110.784690654))
            add(Edge.make_bspline(
                [(59.846395191, 110.784690654), (61.887337052, 98.301496186), (73.317351169, 93.027012339)],
                knots=[0, 0, 0, 1, 1, 1], degree=2))
            Line((73.317351169, 93.027012339), (125.464733978, 93.027012339))
            add(Edge.make_bspline(
                [(125.464733978, 93.027012339), (126.711731964, 92.919963041), (126.96048329, 91.748824412)],
                knots=[0, 0, 0, 1, 1, 1], degree=2))
            Line((126.96048329, 91.748824412), (126.96048329, 85.74475013))
            add(Edge.make_bspline(
                [(126.96048329, 85.74475013), (127.024328685, 84.195885842), (128.497808789, 83.912442397)],
                knots=[0, 0, 0, 1, 1, 1], degree=2))
            Line((128.497808789, 83.912442397), (195.366950221, 83.912442397))
            add(Edge.make_bspline(
                [(161.642347888, 119.295964928), (193.222633695, 115.013388161), (195.366950221, 83.912442397)],
                knots=[0, 0, 0, 1, 1, 1], degree=2))
        make_face()
        with BuildLine():
            Line((195.366950221, 72.802355269), (128.303731924, 72.802355269))
            add(Edge.make_bspline(
                [(128.303731924, 72.802355269), (127.014045367, 72.648063165), (126.96048329, 71.297279055)],
                knots=[0, 0, 0, 1, 1, 1], degree=2))
            Line((126.96048329, 71.297279055), (126.96048329, 66.07466352))
            add(Edge.make_bspline(
                [(126.96048329, 66.07466352), (126.573968469, 64.92692802), (125.30712104, 64.769219048)],
                knots=[0, 0, 0, 1, 1, 1], degree=2))
            Line((125.30712104, 64.769219048), (74.082862231, 64.769219048))
            add(Edge.make_bspline(
                [(74.082862231, 64.769219048), (58.4794695, 55.884745917), (58.811181594, 37.622601841)],
                knots=[0, 0, 0, 1, 1, 1], degree=2))
            Line((58.811181594, 37.622601841), (162.716666362, 37.622601841))
            add(Edge.make_bspline(
                [(162.716666362, 37.622601841), (194.140729717, 41.705995139), (195.366950221, 72.802355269)],
                knots=[0, 0, 0, 1, 1, 1], degree=2))
        make_face()
    extrude(amount=-CUT_EXTRUDE7_DEPTH, mode=Mode.SUBTRACT)

    # Sketch21 → Boss-Extrude10 (add)
    with BuildSketch(Plane(origin=(177.8, 0, 0), x_dir=(0, 0, -1), z_dir=(1, 0, 0))):
        with BuildLine():
            Line((203.2, 6.35), (203.2, 0))
            Line((203.2, 0), (203.2, -6.35))
            Line((203.2, -6.35), (213.36, -6.35))
            ThreePointArc((213.36, -6.35), (207.01, 0), (213.36, 6.35))
            Line((213.36, 6.35), (203.2, 6.35))
        make_face()
        with Locations((213.36, 0)):
            Circle(SKETCH21_R)
    extrude(amount=BOSS_EXTRUDE10_DEPTH)

    # Sketch23 → Boss-Extrude11 (add)
    with BuildSketch(Plane(origin=(76.2, 0, 0), x_dir=(0, 0, -1), z_dir=(1, 0, 0))):
        with BuildLine():
            Line((213.36, 6.35), (203.2, 6.35))
            Line((203.2, 6.35), (203.2, -6.35))
            Line((203.2, -6.35), (213.36, -6.35))
            ThreePointArc((213.36, -6.35), (207.01, 0), (213.36, 6.35))
        make_face()
        with Locations((213.36, 0)):
            Circle(SKETCH23_R)
    extrude(amount=-BOSS_EXTRUDE11_DEPTH)

    # Sketch24 → Cut-Extrude8 (cut)
    with BuildSketch(Plane.ZY.offset(-63.5)):
        with Locations((-213.36, 0)):
            Circle(SKETCH24_R)
    extrude(amount=-CUT_EXTRUDE8_DEPTH, mode=Mode.SUBTRACT)

    # Fillet1
    fillet1_edges = [part.edges().sort_by_distance(p)[0] for p in [
        (184.15, -6.35, -203.2),
        (184.15, 6.35, -203.2),
        (69.85, -6.35, -203.2),
        (69.85, 6.35, -203.2),
    ]]
    fillet(fillet1_edges, radius=FILLET1_R)


solid = part.part
